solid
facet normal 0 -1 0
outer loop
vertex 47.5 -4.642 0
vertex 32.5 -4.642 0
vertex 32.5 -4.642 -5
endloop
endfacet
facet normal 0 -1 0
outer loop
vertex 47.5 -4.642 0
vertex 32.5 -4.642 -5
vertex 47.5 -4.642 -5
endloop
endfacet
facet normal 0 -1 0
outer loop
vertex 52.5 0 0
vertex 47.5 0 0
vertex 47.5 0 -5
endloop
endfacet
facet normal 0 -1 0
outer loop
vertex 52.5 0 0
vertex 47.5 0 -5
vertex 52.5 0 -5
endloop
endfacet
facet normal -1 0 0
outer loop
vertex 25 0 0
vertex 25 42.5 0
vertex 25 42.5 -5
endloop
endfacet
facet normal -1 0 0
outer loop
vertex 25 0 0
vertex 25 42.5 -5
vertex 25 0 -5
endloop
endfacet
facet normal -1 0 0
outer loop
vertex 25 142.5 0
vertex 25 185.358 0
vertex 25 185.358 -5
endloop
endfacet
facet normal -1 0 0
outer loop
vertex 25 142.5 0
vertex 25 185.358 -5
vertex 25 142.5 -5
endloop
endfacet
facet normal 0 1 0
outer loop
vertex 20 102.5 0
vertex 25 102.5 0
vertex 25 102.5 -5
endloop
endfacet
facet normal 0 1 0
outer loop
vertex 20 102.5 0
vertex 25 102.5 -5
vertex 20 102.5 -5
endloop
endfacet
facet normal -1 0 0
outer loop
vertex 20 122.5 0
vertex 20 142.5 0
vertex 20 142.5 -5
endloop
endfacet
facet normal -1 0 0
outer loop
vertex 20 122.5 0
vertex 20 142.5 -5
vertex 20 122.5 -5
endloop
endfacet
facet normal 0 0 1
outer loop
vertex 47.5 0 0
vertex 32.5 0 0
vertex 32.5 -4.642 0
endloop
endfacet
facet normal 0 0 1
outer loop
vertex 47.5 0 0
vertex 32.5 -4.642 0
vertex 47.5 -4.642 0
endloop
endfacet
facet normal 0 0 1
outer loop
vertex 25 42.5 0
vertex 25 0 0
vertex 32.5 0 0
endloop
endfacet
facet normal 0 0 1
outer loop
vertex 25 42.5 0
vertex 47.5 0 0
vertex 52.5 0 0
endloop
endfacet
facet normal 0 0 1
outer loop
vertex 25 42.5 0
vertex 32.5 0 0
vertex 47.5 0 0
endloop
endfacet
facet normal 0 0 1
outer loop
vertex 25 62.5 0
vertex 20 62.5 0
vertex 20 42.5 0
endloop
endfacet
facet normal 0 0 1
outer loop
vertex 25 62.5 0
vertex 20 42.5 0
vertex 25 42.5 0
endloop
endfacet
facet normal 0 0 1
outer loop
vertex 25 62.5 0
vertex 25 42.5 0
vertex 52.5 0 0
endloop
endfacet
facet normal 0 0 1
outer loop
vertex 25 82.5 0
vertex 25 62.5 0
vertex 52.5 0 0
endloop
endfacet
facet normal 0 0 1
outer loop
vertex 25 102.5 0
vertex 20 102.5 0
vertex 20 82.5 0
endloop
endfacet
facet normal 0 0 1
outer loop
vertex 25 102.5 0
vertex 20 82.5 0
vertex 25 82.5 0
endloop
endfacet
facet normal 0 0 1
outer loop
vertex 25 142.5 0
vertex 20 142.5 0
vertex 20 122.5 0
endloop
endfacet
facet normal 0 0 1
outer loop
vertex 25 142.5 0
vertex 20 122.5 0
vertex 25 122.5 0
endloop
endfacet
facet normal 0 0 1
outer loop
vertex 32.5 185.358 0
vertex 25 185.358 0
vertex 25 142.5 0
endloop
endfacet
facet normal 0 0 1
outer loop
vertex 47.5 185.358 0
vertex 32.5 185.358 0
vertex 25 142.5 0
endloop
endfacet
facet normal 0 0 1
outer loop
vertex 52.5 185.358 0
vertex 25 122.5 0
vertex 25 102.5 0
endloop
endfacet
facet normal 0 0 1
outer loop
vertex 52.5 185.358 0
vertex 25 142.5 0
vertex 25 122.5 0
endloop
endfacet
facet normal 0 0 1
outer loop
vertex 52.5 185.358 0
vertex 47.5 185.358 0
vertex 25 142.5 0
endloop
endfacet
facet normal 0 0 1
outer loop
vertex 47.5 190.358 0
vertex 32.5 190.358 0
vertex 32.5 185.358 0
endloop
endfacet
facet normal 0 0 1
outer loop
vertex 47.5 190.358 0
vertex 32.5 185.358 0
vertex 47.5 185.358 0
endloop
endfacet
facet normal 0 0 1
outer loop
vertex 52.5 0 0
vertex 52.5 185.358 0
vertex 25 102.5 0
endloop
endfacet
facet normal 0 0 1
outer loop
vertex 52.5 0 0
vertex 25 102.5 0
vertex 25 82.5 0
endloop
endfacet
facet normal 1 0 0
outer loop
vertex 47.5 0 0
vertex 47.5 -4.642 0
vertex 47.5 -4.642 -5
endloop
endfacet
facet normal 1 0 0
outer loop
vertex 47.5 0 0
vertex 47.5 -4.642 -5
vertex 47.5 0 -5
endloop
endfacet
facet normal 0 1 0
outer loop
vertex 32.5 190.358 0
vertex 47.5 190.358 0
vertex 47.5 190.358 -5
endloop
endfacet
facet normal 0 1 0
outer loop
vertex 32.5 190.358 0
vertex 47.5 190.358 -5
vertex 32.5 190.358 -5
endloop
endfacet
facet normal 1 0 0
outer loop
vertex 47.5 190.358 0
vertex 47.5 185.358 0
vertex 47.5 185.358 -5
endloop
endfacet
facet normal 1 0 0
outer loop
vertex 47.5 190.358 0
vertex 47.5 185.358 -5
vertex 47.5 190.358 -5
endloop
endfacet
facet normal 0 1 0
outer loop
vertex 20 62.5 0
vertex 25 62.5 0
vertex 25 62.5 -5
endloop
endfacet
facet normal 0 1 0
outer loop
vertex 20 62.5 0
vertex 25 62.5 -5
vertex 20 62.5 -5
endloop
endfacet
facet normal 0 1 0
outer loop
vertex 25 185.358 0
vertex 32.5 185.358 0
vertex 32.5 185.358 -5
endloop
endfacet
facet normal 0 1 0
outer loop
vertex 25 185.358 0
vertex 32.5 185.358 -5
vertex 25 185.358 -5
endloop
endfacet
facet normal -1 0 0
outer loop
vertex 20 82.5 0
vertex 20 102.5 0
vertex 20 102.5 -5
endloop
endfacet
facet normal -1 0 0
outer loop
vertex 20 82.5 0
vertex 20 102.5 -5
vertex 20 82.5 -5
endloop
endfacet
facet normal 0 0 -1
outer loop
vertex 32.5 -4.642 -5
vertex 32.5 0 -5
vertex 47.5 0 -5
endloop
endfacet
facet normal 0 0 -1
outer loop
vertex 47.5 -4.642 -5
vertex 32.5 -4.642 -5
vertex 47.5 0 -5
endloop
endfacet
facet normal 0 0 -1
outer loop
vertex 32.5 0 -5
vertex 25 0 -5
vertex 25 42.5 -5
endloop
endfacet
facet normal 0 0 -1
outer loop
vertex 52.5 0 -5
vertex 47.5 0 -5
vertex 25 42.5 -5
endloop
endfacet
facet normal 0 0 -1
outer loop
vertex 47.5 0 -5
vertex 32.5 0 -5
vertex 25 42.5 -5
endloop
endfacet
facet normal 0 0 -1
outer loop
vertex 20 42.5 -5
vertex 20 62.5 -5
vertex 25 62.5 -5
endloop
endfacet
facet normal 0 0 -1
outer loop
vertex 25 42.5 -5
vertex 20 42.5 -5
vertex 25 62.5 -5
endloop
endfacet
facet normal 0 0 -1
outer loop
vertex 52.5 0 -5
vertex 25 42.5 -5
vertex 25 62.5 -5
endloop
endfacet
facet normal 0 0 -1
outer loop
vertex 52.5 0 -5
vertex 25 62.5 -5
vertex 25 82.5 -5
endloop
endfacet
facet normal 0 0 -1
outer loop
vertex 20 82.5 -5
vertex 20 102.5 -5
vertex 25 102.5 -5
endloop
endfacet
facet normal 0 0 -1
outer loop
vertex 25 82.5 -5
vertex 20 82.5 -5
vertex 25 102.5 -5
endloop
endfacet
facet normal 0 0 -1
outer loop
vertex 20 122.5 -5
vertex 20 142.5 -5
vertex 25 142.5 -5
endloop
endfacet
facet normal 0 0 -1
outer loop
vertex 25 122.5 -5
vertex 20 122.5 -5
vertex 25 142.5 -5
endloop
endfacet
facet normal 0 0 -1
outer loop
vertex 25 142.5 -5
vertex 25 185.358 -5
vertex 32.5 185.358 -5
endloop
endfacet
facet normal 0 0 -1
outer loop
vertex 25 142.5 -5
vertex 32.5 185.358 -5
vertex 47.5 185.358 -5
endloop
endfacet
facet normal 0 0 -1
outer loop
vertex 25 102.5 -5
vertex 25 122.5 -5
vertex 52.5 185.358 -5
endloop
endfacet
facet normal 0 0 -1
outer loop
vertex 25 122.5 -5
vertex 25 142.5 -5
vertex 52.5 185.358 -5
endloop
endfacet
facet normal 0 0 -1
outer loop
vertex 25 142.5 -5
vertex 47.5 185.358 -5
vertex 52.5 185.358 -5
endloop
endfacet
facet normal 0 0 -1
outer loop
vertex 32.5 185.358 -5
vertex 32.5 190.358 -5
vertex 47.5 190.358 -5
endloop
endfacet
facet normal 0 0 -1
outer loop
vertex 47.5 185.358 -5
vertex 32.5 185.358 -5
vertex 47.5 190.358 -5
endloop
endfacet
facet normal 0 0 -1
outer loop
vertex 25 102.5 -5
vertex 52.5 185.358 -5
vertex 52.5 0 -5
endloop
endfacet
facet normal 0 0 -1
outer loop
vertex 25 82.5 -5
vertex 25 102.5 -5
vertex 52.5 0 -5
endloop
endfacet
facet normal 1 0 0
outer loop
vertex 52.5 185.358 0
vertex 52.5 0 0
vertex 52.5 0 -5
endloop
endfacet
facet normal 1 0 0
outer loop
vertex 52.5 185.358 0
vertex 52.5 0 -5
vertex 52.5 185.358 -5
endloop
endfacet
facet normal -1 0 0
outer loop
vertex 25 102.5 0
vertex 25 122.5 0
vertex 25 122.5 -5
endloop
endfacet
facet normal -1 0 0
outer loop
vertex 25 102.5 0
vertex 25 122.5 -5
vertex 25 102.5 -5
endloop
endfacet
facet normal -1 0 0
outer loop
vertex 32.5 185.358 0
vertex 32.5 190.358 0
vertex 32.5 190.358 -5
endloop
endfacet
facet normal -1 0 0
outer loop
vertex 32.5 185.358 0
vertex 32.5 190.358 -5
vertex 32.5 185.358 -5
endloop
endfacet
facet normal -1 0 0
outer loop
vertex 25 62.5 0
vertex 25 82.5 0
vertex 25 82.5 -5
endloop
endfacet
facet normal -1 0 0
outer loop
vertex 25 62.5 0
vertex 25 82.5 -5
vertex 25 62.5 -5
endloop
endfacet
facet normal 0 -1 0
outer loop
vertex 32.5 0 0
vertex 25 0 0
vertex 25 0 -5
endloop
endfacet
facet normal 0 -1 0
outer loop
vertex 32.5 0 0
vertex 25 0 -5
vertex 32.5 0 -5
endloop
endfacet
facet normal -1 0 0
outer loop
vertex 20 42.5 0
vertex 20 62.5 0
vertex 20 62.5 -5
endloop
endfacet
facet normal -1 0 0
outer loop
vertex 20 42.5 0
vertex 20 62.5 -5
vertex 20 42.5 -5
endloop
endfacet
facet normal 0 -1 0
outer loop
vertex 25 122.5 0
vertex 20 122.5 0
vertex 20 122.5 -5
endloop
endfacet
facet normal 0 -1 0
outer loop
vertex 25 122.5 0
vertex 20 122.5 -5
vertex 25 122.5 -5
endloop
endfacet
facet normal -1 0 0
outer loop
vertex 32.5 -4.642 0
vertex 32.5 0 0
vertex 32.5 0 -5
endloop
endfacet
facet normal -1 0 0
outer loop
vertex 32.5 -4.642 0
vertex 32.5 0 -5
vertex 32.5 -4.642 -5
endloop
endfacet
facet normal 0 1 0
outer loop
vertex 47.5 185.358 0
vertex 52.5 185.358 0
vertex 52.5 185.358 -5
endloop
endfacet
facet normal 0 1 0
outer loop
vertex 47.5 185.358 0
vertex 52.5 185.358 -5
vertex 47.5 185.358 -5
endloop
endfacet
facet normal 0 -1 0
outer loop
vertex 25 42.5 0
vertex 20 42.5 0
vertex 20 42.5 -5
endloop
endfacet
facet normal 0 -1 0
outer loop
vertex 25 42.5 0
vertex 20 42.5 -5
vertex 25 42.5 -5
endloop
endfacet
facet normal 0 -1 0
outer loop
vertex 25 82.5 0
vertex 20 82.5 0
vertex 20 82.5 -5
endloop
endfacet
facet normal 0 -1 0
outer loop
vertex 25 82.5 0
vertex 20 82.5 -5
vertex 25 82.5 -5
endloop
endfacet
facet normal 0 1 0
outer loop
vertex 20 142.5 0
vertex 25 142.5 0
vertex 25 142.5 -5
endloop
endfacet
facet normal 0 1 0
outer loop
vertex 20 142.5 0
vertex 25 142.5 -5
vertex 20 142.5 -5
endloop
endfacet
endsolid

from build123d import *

# Parameters (mm, degrees)
BOSS_EXTRUDE1_DEPTH = 5


with BuildPart() as part:
    # Sketch1 → Boss-Extrude1 (new body)
    with BuildSketch(Plane.XY):
        Polygon((52.5, 185.35845109), (47.5, 185.35845109), (47.5, 190.35845109), (32.5, 190.35845109), (32.5, 185.35845109), (25, 185.35845109), (25, 142.5), (20, 142.5), (20, 122.5), (25, 122.5), (25, 102.5), (20, 102.5), (20, 82.5), (25, 82.5), (25, 62.5), (20, 62.5), (20, 42.5), (25, 42.5), (25, 0), (32.5, 0), (32.5, -4.64154891), (40, -4.64154891), (47.5, -4.64154891), (47.5, 0), (52.5, 0), align=None)
    extrude(amount=-BOSS_EXTRUDE1_DEPTH)


solid = part.part
